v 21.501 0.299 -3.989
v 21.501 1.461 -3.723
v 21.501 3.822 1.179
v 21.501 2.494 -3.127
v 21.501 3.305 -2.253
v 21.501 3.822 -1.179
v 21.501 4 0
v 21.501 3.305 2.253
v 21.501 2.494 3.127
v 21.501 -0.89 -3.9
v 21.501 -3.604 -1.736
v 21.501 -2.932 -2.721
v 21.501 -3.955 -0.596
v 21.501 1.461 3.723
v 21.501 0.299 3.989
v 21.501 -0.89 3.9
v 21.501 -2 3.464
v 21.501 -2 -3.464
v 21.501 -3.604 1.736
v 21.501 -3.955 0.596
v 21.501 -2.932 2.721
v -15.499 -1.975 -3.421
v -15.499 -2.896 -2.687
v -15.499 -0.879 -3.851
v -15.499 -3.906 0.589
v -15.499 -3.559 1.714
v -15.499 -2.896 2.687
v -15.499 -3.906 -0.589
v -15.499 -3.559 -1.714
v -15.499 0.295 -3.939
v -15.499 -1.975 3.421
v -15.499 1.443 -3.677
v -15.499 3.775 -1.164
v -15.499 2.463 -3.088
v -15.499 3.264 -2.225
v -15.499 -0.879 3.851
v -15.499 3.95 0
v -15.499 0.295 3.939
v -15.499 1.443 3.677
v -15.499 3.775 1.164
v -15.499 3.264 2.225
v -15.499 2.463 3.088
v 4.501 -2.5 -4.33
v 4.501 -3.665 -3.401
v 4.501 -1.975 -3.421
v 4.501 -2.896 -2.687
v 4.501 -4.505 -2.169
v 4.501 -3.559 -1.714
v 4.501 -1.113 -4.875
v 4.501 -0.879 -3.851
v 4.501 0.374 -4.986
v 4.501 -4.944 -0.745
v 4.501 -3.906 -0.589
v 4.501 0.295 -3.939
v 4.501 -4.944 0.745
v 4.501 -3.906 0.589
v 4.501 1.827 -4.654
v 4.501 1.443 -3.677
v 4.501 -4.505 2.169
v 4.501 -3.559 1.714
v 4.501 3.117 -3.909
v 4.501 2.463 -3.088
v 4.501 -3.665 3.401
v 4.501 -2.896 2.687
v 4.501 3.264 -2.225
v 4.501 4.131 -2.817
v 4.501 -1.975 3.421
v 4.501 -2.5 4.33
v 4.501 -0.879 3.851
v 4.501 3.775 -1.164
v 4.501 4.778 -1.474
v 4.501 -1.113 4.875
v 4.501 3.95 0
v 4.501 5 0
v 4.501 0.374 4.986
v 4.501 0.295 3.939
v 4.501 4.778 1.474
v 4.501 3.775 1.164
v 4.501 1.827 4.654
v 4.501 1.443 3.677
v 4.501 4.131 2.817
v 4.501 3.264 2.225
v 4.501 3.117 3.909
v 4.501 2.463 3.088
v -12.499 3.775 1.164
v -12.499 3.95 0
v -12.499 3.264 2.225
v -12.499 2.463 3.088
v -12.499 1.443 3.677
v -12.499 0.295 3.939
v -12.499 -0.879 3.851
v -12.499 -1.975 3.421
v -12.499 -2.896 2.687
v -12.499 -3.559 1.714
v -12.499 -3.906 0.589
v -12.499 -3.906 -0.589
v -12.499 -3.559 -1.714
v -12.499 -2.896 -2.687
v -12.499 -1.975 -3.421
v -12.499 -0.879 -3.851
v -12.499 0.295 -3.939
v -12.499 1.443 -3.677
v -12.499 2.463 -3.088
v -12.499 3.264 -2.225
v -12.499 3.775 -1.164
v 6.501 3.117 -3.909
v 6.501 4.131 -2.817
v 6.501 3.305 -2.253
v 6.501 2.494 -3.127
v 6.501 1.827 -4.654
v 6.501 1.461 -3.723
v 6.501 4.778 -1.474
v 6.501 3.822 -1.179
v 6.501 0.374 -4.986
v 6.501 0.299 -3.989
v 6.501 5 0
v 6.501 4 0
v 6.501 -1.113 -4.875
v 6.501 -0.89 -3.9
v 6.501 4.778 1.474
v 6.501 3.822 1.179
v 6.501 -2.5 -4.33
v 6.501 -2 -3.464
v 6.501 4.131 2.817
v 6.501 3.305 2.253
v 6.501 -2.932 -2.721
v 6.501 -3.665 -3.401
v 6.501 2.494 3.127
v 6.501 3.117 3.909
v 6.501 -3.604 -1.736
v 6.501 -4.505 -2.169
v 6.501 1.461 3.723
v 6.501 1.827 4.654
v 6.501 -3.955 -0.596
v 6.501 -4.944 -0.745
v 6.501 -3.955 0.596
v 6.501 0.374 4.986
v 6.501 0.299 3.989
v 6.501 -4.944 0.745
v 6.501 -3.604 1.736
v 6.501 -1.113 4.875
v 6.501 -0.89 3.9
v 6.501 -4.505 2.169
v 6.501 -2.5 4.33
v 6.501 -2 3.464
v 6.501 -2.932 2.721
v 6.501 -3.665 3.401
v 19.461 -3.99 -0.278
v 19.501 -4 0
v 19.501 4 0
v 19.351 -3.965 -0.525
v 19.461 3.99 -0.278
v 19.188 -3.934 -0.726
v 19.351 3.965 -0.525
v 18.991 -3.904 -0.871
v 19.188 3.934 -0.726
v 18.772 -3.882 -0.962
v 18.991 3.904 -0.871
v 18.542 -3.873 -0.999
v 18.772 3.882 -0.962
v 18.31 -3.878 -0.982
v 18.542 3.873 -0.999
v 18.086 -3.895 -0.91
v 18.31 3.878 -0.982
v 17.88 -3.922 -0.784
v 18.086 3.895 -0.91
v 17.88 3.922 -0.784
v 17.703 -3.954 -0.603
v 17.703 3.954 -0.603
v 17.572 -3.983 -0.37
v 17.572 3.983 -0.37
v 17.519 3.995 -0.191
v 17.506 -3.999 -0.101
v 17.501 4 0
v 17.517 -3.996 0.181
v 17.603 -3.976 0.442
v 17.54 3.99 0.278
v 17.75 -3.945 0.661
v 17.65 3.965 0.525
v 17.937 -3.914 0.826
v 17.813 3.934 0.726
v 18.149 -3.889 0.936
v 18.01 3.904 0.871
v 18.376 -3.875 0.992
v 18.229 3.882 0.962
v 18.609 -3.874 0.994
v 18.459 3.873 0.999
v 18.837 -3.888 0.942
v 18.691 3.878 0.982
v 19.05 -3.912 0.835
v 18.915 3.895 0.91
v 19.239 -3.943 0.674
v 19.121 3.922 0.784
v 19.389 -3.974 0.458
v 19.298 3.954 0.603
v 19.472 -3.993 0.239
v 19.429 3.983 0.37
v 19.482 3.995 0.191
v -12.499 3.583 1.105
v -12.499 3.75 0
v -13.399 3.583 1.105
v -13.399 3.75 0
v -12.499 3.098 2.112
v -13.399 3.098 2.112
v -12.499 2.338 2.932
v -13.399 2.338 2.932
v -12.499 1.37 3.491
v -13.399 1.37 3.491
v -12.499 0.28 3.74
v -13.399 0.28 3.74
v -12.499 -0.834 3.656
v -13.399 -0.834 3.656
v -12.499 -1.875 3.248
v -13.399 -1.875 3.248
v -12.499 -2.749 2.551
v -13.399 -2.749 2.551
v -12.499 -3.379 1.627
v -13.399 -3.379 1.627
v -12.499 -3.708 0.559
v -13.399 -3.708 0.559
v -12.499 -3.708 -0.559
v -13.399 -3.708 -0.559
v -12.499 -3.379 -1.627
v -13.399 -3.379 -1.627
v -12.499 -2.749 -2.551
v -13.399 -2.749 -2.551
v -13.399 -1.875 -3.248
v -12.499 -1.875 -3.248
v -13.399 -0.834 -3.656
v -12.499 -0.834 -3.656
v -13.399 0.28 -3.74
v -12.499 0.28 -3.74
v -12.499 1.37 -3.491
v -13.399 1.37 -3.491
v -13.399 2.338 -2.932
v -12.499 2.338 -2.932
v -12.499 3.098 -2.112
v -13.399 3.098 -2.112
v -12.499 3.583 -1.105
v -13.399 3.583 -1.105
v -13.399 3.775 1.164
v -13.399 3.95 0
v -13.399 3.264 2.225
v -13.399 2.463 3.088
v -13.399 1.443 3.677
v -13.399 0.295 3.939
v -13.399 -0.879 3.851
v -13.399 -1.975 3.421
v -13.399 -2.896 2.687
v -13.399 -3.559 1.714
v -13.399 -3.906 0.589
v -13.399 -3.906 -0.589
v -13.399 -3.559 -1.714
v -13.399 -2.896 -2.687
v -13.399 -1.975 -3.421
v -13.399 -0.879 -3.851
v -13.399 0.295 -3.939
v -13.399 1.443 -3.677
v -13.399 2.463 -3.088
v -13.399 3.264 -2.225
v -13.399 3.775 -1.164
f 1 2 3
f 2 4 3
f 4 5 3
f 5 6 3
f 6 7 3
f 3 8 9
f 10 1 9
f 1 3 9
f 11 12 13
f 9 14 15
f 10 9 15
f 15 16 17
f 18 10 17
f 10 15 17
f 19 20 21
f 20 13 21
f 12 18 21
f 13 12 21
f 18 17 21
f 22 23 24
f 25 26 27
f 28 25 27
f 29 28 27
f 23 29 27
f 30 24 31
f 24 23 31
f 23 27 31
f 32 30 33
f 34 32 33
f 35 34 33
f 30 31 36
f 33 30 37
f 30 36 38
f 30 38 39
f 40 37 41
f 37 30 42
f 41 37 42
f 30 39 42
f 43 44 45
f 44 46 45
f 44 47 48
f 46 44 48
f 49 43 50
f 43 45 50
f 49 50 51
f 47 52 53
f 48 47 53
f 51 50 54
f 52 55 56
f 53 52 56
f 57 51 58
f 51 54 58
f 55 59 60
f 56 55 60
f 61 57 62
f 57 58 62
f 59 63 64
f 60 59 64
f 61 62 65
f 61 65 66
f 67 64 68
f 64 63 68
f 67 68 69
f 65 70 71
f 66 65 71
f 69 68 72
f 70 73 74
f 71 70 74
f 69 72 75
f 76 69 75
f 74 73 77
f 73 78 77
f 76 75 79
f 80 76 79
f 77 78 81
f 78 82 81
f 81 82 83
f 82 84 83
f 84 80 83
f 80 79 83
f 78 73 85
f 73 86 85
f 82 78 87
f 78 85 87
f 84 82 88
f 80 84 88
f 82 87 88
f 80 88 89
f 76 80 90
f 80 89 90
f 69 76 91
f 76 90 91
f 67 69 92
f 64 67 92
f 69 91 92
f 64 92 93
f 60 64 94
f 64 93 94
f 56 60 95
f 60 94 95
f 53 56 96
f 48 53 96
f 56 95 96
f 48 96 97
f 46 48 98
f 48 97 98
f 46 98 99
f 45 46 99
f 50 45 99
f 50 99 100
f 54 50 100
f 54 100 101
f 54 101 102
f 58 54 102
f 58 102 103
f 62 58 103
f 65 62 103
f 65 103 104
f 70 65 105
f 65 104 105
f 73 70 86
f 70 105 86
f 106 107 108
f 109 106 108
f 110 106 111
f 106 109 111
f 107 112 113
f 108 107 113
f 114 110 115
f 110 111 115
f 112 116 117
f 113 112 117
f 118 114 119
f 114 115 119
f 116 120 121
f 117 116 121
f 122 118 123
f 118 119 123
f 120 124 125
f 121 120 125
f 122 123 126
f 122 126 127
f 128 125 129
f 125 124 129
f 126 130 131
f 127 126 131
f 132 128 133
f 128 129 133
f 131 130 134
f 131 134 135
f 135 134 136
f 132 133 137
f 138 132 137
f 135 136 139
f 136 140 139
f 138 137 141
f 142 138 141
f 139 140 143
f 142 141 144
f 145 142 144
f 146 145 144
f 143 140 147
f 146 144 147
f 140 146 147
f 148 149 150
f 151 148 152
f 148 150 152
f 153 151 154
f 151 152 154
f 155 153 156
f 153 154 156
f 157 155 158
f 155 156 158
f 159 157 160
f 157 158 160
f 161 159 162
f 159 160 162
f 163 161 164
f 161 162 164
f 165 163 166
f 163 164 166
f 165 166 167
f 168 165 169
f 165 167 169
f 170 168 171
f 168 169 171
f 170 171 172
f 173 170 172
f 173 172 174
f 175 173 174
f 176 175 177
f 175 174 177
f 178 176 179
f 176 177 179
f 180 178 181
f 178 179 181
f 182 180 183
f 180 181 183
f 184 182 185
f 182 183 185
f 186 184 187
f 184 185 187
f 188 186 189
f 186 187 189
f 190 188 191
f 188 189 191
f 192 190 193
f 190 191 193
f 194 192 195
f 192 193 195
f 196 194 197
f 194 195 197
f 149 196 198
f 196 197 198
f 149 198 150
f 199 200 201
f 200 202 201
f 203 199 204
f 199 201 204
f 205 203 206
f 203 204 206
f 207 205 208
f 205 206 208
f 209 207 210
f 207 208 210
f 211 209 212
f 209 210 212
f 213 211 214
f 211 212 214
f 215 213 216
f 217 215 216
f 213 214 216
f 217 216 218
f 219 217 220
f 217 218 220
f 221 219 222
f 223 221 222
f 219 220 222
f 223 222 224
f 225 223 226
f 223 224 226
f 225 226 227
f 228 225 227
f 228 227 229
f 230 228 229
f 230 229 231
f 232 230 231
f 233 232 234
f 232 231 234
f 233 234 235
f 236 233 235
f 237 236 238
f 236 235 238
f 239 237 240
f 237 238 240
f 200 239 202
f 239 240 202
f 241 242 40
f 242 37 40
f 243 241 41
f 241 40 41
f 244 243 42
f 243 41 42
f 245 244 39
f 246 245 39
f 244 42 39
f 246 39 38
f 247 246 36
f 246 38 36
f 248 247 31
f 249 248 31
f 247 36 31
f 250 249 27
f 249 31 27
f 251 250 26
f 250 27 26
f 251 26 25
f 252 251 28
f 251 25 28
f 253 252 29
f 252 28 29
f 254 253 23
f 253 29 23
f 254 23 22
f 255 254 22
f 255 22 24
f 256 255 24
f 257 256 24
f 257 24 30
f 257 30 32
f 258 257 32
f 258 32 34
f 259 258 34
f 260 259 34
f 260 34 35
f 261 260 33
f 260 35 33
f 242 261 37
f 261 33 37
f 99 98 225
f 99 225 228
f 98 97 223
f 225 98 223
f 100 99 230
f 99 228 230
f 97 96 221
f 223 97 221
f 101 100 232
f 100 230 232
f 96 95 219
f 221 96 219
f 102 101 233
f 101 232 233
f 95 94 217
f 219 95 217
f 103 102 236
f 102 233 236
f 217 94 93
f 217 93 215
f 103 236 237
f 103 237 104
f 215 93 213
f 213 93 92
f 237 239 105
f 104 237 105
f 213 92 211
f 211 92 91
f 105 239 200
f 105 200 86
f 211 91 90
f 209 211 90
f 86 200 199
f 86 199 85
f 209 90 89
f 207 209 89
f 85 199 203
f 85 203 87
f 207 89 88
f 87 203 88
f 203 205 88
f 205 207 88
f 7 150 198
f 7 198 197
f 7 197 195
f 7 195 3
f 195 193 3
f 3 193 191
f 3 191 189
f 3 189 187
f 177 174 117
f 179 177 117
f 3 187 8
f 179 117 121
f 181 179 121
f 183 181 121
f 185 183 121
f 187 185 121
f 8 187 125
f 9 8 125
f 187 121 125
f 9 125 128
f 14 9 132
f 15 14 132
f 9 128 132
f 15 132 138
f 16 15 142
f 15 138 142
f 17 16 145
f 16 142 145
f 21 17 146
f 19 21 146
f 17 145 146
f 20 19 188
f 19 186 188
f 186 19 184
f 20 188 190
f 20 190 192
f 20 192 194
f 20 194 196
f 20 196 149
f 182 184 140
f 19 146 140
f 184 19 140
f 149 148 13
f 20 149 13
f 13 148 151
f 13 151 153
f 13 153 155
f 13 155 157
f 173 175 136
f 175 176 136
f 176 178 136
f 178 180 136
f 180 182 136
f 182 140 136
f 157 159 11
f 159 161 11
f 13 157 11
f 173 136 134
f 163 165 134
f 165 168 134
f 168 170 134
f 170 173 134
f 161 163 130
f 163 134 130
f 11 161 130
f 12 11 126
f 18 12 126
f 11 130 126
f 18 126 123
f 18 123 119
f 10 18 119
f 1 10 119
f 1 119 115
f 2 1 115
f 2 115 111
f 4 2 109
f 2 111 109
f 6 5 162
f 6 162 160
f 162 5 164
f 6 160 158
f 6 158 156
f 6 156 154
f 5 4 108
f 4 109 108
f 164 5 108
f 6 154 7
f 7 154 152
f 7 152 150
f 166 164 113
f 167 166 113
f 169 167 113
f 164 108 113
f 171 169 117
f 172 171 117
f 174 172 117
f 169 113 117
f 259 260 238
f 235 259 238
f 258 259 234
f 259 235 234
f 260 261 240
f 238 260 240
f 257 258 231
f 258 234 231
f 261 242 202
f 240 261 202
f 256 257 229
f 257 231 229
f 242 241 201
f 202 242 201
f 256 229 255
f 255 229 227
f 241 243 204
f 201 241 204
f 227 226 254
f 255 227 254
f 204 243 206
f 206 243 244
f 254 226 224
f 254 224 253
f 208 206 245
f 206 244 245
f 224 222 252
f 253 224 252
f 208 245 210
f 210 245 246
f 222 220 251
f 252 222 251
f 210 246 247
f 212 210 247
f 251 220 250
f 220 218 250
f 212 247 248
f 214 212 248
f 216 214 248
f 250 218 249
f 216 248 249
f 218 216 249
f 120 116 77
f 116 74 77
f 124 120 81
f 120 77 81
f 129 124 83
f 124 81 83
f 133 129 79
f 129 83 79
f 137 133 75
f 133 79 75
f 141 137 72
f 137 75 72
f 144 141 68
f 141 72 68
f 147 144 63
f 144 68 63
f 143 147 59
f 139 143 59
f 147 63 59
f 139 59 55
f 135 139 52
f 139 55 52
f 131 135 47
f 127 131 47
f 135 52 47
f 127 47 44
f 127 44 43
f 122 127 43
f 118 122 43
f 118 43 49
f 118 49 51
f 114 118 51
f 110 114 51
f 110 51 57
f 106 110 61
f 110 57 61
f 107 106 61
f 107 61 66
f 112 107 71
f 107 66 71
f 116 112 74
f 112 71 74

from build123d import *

# Parameters (mm, degrees)
SKETCH_2_R          = 1
CUT_EXTRUDE_1_DEPTH = 5


with BuildPart() as part:
    # 草图1 → 旋转1 (revolve)
    with BuildSketch(Plane.XY):
        Polygon((-15.499429975, 0), (21.500570025, 0), (21.500570025, 4), (6.500570025, 4), (6.500570025, 5), (4.500570025, 5), (4.500570025, 3.95), (-12.499429975, 3.95), (-12.499429975, 3.75), (-13.399429975, 3.75), (-13.399429975, 3.95), (-15.499429975, 3.95), align=None)
    revolve(axis=Axis((-15.499429975, 0, 0), (1, 0, 0)))

    # 草图2 → 切除-拉伸1 (cut, symmetric)
    with BuildSketch(Plane(origin=(0, 0, 0), x_dir=(1, 0, 0), z_dir=(0, 1, 0))):
        with Locations((18.500570025, 0)):
            Circle(SKETCH_2_R)
    extrude(amount=CUT_EXTRUDE_1_DEPTH, both=True, mode=Mode.SUBTRACT)


solid = part.part
